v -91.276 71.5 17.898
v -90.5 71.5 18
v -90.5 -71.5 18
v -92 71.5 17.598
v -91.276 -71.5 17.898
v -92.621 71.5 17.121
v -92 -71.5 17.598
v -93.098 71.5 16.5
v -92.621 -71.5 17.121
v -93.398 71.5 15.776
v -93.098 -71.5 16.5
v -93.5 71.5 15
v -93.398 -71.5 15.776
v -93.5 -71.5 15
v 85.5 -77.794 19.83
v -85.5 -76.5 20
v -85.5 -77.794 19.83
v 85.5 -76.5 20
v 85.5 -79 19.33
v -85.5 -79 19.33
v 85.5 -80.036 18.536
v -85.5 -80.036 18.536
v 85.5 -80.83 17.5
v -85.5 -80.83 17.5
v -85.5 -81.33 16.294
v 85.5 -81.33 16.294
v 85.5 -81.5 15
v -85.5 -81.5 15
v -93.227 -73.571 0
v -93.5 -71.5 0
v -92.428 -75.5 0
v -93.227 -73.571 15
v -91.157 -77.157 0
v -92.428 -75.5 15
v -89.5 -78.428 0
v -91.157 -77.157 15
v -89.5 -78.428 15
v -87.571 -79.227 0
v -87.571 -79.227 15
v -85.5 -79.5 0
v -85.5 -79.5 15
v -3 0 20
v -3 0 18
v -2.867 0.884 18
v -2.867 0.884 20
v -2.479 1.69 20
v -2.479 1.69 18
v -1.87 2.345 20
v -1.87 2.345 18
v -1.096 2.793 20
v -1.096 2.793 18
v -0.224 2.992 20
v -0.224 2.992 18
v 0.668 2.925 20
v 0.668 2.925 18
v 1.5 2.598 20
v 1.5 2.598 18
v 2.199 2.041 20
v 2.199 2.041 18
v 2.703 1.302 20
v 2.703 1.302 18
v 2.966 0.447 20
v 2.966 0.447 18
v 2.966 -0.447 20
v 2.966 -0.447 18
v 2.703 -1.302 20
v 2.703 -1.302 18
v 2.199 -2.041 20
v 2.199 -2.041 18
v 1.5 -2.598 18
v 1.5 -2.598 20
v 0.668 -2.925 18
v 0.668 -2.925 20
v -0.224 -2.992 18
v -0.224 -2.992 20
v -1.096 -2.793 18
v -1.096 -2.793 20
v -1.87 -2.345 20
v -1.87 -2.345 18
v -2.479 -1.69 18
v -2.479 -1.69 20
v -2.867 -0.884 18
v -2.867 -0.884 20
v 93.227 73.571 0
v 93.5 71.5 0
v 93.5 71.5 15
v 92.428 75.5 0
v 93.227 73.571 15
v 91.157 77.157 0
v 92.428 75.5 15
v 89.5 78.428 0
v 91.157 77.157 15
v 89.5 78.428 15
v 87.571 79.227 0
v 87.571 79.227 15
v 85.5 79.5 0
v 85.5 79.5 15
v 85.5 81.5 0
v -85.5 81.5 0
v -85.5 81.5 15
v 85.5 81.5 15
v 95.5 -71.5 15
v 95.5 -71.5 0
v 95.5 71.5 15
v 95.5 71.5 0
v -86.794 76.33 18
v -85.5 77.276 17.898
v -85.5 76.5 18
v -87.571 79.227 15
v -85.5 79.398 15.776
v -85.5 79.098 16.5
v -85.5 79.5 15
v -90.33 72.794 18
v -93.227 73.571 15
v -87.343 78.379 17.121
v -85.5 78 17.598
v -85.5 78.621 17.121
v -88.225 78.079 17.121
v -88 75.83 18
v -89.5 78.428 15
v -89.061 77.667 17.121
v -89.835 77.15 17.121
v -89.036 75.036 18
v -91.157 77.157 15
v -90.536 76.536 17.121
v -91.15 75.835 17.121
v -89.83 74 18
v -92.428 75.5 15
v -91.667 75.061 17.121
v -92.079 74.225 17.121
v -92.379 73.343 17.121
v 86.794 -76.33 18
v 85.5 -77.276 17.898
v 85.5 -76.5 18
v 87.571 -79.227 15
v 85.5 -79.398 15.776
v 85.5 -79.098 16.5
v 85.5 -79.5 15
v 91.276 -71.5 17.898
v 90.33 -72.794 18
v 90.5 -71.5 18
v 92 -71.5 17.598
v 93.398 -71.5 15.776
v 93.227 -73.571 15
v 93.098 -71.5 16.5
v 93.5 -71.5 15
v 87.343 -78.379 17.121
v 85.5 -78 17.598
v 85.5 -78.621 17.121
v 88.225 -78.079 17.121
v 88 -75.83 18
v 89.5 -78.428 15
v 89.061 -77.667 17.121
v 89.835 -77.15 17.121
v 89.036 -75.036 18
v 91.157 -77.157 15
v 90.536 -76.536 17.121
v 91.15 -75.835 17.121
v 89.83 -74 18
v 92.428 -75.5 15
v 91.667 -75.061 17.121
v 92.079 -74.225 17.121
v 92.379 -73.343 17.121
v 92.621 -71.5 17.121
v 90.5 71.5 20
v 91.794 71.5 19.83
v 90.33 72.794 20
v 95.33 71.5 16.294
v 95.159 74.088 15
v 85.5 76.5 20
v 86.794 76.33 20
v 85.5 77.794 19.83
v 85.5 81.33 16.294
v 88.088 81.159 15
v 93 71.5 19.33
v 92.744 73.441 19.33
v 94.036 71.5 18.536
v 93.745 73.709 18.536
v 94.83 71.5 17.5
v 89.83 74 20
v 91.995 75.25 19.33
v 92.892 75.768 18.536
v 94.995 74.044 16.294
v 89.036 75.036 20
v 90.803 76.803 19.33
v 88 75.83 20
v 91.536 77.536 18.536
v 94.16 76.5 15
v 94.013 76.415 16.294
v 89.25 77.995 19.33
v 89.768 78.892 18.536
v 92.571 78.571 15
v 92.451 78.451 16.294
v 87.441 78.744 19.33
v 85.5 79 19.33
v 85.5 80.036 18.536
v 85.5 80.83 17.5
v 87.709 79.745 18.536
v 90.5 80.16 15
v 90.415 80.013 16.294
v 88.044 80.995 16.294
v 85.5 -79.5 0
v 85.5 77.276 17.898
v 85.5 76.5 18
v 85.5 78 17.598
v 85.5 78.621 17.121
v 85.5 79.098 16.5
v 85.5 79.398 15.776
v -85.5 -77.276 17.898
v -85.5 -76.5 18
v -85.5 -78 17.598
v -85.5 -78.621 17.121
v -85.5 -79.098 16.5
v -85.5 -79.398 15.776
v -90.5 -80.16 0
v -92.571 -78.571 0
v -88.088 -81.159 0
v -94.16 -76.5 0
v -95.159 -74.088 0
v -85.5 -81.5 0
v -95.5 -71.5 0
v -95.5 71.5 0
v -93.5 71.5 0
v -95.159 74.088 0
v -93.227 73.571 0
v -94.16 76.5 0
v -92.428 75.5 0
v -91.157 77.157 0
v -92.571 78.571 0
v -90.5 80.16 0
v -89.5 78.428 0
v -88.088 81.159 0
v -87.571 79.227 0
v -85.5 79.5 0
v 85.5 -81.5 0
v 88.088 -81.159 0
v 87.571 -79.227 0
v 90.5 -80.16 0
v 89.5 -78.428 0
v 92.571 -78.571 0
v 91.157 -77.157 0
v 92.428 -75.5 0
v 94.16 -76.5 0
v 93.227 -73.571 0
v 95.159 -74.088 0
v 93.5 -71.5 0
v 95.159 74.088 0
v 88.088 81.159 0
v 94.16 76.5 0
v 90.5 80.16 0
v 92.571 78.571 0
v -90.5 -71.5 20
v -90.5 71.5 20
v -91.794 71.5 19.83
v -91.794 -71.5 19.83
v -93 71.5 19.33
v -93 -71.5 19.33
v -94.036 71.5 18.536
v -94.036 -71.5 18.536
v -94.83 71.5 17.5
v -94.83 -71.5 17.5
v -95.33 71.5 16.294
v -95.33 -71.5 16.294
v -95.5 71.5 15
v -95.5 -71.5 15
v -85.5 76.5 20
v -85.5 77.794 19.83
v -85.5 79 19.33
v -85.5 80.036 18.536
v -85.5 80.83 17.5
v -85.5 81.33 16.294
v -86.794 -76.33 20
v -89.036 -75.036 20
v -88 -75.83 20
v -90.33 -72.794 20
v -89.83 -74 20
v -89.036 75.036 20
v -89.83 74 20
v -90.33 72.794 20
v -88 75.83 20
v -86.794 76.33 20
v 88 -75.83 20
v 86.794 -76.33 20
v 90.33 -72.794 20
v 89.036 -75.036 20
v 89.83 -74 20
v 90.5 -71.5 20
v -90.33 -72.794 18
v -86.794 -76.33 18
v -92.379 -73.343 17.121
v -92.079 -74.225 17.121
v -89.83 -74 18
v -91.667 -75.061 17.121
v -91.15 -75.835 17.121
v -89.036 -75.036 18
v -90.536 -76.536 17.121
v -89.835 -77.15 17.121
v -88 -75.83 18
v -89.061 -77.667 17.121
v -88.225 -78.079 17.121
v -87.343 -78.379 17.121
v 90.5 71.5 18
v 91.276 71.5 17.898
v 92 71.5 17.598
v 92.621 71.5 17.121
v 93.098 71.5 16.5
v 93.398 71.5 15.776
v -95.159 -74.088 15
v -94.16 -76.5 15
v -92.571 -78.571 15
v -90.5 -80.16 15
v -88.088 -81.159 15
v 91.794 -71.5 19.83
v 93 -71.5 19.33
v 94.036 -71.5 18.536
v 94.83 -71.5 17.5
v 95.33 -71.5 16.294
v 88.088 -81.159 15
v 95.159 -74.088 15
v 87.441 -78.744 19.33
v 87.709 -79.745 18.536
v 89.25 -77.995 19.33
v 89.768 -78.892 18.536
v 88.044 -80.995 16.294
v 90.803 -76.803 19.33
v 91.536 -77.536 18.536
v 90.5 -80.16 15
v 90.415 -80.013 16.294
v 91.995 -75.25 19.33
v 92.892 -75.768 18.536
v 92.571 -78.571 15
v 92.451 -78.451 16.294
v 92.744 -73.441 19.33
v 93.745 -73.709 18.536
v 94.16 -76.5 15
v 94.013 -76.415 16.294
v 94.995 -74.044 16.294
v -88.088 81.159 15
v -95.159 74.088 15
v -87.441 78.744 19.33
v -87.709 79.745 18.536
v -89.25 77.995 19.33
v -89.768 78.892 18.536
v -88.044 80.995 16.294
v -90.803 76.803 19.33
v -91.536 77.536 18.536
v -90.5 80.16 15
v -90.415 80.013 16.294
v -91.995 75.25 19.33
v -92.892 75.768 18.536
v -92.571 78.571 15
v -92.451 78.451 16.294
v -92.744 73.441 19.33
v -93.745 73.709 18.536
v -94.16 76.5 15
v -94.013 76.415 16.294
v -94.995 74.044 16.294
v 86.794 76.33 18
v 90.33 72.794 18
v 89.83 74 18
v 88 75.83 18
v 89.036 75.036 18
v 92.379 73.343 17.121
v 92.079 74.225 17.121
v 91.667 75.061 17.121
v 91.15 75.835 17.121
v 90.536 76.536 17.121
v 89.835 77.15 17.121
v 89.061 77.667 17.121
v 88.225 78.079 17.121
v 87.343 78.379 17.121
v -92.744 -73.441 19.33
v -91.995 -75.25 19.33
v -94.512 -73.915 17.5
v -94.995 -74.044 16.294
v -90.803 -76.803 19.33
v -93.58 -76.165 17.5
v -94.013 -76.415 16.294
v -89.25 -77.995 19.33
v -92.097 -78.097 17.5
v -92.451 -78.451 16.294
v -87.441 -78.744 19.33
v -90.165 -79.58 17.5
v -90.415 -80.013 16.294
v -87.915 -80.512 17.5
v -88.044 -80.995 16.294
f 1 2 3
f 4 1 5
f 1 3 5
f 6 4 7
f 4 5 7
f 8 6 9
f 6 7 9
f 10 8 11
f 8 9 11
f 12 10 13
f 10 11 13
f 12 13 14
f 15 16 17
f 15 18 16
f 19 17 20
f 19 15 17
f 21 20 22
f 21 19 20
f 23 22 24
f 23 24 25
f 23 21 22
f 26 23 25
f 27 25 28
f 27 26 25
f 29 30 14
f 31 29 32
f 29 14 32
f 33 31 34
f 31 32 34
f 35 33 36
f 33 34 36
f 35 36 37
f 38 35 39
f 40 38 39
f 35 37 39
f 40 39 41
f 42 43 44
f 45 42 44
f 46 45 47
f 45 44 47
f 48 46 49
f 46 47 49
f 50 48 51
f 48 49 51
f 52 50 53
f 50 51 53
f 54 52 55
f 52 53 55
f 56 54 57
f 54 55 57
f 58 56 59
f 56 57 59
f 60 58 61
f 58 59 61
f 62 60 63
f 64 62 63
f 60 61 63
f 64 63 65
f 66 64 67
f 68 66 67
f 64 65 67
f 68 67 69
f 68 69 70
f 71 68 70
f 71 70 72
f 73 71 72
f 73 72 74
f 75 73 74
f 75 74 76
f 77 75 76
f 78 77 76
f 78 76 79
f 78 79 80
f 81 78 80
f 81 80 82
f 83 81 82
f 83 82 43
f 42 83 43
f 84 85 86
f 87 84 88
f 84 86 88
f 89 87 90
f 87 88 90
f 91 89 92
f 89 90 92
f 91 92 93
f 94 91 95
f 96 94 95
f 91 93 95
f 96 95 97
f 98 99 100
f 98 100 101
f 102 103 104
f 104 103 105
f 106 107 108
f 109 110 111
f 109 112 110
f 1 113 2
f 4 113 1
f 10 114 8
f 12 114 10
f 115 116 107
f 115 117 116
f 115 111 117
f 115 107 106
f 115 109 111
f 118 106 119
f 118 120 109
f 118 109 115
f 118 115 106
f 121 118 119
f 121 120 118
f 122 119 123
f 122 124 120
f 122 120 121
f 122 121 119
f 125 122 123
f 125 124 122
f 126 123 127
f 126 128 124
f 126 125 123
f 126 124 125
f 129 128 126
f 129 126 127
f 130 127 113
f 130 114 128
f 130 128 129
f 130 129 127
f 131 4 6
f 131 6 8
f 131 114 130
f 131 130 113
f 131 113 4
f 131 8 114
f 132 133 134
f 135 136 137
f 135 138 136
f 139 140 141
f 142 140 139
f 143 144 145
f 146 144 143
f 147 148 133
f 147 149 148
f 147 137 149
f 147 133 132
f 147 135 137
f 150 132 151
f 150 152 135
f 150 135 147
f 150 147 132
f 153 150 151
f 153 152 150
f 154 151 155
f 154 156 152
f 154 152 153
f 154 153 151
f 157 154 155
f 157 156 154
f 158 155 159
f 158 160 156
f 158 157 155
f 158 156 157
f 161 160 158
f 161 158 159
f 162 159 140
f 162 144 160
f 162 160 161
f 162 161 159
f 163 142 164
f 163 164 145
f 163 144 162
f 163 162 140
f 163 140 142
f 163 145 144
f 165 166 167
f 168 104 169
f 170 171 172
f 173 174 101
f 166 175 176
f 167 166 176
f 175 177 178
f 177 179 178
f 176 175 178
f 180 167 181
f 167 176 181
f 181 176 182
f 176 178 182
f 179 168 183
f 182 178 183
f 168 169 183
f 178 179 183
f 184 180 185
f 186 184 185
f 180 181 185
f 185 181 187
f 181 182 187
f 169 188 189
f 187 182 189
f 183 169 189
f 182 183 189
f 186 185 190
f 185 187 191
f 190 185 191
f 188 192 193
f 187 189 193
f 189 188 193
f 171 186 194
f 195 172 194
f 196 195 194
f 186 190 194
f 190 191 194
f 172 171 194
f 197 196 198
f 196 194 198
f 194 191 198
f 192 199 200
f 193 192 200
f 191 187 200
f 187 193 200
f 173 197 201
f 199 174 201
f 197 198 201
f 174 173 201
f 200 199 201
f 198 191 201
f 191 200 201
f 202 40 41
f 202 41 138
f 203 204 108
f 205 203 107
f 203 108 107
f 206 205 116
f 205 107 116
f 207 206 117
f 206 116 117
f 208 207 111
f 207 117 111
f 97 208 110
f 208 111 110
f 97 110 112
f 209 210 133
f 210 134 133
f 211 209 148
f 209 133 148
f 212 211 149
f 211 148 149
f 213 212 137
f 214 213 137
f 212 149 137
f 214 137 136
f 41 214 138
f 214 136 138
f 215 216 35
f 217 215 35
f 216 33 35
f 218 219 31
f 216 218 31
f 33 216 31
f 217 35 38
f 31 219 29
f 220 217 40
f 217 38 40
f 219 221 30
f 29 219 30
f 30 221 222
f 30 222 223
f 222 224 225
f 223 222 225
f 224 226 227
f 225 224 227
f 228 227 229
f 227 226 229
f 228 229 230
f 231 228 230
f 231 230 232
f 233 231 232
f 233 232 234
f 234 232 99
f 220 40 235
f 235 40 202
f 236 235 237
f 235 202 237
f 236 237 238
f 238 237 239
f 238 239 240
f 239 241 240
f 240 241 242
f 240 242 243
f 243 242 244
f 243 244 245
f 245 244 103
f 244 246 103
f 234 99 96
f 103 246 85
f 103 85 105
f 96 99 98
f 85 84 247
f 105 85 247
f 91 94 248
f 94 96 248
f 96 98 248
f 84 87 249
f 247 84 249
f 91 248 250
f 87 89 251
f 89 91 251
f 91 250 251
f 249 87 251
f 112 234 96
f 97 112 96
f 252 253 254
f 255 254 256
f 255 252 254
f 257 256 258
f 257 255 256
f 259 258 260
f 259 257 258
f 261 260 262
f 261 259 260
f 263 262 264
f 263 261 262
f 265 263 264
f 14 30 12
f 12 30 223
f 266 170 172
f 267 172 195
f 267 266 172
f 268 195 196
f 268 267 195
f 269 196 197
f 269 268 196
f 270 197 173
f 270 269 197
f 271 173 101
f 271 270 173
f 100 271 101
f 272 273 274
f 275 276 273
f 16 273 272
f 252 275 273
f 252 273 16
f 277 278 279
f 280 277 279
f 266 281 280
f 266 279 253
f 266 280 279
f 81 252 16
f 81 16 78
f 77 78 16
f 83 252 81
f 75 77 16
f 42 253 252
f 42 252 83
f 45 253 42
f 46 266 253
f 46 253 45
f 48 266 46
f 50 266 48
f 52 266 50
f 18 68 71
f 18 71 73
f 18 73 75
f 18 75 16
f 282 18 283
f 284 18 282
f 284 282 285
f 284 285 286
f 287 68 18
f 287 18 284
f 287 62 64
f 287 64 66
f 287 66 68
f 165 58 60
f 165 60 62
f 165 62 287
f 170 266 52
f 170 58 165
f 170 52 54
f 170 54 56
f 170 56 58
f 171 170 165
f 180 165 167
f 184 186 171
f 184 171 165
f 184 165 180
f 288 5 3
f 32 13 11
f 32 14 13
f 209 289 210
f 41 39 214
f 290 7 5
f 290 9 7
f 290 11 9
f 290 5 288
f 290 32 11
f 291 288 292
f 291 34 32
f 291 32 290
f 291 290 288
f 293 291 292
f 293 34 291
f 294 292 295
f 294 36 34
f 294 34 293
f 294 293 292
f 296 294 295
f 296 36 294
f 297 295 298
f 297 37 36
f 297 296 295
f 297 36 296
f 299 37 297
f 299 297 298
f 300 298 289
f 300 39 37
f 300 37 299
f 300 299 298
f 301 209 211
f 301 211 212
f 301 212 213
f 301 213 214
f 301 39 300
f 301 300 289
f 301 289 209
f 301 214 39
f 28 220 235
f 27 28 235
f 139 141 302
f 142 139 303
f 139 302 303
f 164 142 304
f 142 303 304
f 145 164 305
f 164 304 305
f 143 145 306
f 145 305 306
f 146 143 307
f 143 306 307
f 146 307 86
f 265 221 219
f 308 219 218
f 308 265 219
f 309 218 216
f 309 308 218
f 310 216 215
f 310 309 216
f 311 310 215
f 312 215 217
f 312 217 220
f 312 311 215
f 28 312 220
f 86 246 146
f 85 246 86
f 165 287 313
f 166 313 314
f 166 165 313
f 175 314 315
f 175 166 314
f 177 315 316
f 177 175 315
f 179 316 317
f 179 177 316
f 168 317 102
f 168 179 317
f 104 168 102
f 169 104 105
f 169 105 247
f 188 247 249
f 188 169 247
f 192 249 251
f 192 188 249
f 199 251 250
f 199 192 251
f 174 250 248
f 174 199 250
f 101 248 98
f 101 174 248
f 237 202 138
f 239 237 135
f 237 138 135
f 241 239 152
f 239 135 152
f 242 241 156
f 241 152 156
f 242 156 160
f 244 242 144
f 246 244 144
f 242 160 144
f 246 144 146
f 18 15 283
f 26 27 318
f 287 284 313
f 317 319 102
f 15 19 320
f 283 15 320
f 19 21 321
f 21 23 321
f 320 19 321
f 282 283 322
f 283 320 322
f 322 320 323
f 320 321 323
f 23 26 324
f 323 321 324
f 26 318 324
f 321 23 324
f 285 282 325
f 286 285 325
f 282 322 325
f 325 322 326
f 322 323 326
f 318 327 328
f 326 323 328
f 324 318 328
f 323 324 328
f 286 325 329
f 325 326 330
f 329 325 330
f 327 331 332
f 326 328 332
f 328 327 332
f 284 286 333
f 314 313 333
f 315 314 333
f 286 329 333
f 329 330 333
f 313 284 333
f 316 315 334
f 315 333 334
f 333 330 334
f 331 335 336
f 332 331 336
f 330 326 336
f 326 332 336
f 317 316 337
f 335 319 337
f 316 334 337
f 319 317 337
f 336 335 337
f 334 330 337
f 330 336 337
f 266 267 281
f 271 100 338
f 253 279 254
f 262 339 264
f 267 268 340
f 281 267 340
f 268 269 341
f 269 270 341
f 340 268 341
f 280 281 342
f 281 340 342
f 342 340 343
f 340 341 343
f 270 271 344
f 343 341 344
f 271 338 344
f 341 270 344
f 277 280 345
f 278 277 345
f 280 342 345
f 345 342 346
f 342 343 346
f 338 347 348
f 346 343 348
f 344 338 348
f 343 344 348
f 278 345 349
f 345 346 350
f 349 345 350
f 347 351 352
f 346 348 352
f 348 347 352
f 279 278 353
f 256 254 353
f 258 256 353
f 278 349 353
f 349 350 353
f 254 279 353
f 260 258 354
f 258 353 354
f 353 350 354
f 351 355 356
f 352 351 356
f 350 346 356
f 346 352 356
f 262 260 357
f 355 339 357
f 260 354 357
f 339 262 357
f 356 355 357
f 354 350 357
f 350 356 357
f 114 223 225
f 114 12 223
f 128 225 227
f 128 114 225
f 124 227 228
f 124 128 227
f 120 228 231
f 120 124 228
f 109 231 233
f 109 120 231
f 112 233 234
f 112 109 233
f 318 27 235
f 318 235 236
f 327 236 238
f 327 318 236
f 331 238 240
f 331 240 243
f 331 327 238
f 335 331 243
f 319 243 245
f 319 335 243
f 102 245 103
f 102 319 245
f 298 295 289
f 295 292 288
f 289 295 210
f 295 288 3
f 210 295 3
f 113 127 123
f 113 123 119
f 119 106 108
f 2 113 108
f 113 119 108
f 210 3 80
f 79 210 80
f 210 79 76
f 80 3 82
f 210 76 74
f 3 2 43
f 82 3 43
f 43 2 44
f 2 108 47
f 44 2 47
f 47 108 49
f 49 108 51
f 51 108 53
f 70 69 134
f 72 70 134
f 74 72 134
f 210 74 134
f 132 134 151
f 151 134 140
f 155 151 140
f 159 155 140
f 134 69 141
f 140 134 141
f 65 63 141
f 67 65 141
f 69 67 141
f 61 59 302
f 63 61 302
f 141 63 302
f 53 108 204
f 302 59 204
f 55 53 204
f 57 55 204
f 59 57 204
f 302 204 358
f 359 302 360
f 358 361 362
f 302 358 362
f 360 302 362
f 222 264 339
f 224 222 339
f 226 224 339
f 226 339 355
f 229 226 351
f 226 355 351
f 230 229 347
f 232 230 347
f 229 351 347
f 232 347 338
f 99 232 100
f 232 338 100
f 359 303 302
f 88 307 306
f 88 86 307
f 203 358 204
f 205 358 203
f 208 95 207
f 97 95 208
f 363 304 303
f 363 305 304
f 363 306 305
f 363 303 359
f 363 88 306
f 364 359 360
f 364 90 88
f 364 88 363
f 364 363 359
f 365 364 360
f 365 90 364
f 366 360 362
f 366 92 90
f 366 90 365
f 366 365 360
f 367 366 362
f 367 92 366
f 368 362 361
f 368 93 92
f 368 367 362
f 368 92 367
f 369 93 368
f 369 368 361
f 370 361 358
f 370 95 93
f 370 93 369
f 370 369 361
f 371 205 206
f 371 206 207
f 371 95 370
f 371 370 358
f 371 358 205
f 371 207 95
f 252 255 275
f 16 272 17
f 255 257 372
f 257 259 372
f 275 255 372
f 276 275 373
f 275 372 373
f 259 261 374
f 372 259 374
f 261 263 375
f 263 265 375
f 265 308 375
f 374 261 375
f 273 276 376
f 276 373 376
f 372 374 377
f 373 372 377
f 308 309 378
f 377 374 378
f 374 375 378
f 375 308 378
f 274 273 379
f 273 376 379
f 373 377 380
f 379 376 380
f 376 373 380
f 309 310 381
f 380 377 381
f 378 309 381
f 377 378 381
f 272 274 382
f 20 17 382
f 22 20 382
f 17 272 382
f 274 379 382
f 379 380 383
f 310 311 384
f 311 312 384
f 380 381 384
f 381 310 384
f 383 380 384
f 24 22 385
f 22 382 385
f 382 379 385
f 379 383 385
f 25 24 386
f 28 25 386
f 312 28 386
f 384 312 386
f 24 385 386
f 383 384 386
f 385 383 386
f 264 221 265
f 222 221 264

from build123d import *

# Parameters (mm, degrees)
SKETCH1_W           = 191
SKETCH1_H           = 163
BOSS_EXTRUDE1_DEPTH = 20
FILLET1_R           = 10
FILLET2_R           = 5
SHELL1_T            = -2
SKETCH2_R           = 3
CUT_EXTRUDE1_DEPTH  = 10


with BuildPart() as part:
    # Sketch1 → Boss-Extrude1 (new body)
    with BuildSketch(Plane.XY):
        Rectangle(SKETCH1_W, SKETCH1_H)
    extrude(amount=BOSS_EXTRUDE1_DEPTH)

    # Fillet1
    fillet1_edges = [part.edges().sort_by_distance(p)[0] for p in [
        (95.5, -81.5, 10),
        (-95.5, -81.5, 10),
        (-95.5, 81.5, 10),
        (95.5, 81.5, 10),
    ]]
    fillet(fillet1_edges, radius=FILLET1_R)

    # Fillet2
    fillet2_edges = [part.edges().sort_by_distance(p)[0] for p in [
        (0, -81.5, 20),
        (-95.5, 0, 20),
        (95.5, 0, 20),
        (0, 81.5, 20),
        (-92.571067812, 78.571067812, 20),
        (92.571067812, 78.571067812, 20),
        (92.571067812, -78.571067812, 20),
        (-92.571067812, -78.571067812, 20),
    ]]
    fillet(fillet2_edges, radius=FILLET2_R)

    # Shell1
    shell1_openings = [part.faces().sort_by_distance(p)[0] for p in [
        (0, 0, 0),
    ]]
    offset(amount=SHELL1_T, openings=shell1_openings, kind=Kind.INTERSECTION)

    # Sketch2 → Cut-Extrude1 (cut)
    with BuildSketch(Plane(origin=(0, 0, 18), x_dir=(-1, 0, 0), z_dir=(0, 0, -1))):
        Circle(SKETCH2_R)
    extrude(amount=-CUT_EXTRUDE1_DEPTH, mode=Mode.SUBTRACT)


solid = part.part
